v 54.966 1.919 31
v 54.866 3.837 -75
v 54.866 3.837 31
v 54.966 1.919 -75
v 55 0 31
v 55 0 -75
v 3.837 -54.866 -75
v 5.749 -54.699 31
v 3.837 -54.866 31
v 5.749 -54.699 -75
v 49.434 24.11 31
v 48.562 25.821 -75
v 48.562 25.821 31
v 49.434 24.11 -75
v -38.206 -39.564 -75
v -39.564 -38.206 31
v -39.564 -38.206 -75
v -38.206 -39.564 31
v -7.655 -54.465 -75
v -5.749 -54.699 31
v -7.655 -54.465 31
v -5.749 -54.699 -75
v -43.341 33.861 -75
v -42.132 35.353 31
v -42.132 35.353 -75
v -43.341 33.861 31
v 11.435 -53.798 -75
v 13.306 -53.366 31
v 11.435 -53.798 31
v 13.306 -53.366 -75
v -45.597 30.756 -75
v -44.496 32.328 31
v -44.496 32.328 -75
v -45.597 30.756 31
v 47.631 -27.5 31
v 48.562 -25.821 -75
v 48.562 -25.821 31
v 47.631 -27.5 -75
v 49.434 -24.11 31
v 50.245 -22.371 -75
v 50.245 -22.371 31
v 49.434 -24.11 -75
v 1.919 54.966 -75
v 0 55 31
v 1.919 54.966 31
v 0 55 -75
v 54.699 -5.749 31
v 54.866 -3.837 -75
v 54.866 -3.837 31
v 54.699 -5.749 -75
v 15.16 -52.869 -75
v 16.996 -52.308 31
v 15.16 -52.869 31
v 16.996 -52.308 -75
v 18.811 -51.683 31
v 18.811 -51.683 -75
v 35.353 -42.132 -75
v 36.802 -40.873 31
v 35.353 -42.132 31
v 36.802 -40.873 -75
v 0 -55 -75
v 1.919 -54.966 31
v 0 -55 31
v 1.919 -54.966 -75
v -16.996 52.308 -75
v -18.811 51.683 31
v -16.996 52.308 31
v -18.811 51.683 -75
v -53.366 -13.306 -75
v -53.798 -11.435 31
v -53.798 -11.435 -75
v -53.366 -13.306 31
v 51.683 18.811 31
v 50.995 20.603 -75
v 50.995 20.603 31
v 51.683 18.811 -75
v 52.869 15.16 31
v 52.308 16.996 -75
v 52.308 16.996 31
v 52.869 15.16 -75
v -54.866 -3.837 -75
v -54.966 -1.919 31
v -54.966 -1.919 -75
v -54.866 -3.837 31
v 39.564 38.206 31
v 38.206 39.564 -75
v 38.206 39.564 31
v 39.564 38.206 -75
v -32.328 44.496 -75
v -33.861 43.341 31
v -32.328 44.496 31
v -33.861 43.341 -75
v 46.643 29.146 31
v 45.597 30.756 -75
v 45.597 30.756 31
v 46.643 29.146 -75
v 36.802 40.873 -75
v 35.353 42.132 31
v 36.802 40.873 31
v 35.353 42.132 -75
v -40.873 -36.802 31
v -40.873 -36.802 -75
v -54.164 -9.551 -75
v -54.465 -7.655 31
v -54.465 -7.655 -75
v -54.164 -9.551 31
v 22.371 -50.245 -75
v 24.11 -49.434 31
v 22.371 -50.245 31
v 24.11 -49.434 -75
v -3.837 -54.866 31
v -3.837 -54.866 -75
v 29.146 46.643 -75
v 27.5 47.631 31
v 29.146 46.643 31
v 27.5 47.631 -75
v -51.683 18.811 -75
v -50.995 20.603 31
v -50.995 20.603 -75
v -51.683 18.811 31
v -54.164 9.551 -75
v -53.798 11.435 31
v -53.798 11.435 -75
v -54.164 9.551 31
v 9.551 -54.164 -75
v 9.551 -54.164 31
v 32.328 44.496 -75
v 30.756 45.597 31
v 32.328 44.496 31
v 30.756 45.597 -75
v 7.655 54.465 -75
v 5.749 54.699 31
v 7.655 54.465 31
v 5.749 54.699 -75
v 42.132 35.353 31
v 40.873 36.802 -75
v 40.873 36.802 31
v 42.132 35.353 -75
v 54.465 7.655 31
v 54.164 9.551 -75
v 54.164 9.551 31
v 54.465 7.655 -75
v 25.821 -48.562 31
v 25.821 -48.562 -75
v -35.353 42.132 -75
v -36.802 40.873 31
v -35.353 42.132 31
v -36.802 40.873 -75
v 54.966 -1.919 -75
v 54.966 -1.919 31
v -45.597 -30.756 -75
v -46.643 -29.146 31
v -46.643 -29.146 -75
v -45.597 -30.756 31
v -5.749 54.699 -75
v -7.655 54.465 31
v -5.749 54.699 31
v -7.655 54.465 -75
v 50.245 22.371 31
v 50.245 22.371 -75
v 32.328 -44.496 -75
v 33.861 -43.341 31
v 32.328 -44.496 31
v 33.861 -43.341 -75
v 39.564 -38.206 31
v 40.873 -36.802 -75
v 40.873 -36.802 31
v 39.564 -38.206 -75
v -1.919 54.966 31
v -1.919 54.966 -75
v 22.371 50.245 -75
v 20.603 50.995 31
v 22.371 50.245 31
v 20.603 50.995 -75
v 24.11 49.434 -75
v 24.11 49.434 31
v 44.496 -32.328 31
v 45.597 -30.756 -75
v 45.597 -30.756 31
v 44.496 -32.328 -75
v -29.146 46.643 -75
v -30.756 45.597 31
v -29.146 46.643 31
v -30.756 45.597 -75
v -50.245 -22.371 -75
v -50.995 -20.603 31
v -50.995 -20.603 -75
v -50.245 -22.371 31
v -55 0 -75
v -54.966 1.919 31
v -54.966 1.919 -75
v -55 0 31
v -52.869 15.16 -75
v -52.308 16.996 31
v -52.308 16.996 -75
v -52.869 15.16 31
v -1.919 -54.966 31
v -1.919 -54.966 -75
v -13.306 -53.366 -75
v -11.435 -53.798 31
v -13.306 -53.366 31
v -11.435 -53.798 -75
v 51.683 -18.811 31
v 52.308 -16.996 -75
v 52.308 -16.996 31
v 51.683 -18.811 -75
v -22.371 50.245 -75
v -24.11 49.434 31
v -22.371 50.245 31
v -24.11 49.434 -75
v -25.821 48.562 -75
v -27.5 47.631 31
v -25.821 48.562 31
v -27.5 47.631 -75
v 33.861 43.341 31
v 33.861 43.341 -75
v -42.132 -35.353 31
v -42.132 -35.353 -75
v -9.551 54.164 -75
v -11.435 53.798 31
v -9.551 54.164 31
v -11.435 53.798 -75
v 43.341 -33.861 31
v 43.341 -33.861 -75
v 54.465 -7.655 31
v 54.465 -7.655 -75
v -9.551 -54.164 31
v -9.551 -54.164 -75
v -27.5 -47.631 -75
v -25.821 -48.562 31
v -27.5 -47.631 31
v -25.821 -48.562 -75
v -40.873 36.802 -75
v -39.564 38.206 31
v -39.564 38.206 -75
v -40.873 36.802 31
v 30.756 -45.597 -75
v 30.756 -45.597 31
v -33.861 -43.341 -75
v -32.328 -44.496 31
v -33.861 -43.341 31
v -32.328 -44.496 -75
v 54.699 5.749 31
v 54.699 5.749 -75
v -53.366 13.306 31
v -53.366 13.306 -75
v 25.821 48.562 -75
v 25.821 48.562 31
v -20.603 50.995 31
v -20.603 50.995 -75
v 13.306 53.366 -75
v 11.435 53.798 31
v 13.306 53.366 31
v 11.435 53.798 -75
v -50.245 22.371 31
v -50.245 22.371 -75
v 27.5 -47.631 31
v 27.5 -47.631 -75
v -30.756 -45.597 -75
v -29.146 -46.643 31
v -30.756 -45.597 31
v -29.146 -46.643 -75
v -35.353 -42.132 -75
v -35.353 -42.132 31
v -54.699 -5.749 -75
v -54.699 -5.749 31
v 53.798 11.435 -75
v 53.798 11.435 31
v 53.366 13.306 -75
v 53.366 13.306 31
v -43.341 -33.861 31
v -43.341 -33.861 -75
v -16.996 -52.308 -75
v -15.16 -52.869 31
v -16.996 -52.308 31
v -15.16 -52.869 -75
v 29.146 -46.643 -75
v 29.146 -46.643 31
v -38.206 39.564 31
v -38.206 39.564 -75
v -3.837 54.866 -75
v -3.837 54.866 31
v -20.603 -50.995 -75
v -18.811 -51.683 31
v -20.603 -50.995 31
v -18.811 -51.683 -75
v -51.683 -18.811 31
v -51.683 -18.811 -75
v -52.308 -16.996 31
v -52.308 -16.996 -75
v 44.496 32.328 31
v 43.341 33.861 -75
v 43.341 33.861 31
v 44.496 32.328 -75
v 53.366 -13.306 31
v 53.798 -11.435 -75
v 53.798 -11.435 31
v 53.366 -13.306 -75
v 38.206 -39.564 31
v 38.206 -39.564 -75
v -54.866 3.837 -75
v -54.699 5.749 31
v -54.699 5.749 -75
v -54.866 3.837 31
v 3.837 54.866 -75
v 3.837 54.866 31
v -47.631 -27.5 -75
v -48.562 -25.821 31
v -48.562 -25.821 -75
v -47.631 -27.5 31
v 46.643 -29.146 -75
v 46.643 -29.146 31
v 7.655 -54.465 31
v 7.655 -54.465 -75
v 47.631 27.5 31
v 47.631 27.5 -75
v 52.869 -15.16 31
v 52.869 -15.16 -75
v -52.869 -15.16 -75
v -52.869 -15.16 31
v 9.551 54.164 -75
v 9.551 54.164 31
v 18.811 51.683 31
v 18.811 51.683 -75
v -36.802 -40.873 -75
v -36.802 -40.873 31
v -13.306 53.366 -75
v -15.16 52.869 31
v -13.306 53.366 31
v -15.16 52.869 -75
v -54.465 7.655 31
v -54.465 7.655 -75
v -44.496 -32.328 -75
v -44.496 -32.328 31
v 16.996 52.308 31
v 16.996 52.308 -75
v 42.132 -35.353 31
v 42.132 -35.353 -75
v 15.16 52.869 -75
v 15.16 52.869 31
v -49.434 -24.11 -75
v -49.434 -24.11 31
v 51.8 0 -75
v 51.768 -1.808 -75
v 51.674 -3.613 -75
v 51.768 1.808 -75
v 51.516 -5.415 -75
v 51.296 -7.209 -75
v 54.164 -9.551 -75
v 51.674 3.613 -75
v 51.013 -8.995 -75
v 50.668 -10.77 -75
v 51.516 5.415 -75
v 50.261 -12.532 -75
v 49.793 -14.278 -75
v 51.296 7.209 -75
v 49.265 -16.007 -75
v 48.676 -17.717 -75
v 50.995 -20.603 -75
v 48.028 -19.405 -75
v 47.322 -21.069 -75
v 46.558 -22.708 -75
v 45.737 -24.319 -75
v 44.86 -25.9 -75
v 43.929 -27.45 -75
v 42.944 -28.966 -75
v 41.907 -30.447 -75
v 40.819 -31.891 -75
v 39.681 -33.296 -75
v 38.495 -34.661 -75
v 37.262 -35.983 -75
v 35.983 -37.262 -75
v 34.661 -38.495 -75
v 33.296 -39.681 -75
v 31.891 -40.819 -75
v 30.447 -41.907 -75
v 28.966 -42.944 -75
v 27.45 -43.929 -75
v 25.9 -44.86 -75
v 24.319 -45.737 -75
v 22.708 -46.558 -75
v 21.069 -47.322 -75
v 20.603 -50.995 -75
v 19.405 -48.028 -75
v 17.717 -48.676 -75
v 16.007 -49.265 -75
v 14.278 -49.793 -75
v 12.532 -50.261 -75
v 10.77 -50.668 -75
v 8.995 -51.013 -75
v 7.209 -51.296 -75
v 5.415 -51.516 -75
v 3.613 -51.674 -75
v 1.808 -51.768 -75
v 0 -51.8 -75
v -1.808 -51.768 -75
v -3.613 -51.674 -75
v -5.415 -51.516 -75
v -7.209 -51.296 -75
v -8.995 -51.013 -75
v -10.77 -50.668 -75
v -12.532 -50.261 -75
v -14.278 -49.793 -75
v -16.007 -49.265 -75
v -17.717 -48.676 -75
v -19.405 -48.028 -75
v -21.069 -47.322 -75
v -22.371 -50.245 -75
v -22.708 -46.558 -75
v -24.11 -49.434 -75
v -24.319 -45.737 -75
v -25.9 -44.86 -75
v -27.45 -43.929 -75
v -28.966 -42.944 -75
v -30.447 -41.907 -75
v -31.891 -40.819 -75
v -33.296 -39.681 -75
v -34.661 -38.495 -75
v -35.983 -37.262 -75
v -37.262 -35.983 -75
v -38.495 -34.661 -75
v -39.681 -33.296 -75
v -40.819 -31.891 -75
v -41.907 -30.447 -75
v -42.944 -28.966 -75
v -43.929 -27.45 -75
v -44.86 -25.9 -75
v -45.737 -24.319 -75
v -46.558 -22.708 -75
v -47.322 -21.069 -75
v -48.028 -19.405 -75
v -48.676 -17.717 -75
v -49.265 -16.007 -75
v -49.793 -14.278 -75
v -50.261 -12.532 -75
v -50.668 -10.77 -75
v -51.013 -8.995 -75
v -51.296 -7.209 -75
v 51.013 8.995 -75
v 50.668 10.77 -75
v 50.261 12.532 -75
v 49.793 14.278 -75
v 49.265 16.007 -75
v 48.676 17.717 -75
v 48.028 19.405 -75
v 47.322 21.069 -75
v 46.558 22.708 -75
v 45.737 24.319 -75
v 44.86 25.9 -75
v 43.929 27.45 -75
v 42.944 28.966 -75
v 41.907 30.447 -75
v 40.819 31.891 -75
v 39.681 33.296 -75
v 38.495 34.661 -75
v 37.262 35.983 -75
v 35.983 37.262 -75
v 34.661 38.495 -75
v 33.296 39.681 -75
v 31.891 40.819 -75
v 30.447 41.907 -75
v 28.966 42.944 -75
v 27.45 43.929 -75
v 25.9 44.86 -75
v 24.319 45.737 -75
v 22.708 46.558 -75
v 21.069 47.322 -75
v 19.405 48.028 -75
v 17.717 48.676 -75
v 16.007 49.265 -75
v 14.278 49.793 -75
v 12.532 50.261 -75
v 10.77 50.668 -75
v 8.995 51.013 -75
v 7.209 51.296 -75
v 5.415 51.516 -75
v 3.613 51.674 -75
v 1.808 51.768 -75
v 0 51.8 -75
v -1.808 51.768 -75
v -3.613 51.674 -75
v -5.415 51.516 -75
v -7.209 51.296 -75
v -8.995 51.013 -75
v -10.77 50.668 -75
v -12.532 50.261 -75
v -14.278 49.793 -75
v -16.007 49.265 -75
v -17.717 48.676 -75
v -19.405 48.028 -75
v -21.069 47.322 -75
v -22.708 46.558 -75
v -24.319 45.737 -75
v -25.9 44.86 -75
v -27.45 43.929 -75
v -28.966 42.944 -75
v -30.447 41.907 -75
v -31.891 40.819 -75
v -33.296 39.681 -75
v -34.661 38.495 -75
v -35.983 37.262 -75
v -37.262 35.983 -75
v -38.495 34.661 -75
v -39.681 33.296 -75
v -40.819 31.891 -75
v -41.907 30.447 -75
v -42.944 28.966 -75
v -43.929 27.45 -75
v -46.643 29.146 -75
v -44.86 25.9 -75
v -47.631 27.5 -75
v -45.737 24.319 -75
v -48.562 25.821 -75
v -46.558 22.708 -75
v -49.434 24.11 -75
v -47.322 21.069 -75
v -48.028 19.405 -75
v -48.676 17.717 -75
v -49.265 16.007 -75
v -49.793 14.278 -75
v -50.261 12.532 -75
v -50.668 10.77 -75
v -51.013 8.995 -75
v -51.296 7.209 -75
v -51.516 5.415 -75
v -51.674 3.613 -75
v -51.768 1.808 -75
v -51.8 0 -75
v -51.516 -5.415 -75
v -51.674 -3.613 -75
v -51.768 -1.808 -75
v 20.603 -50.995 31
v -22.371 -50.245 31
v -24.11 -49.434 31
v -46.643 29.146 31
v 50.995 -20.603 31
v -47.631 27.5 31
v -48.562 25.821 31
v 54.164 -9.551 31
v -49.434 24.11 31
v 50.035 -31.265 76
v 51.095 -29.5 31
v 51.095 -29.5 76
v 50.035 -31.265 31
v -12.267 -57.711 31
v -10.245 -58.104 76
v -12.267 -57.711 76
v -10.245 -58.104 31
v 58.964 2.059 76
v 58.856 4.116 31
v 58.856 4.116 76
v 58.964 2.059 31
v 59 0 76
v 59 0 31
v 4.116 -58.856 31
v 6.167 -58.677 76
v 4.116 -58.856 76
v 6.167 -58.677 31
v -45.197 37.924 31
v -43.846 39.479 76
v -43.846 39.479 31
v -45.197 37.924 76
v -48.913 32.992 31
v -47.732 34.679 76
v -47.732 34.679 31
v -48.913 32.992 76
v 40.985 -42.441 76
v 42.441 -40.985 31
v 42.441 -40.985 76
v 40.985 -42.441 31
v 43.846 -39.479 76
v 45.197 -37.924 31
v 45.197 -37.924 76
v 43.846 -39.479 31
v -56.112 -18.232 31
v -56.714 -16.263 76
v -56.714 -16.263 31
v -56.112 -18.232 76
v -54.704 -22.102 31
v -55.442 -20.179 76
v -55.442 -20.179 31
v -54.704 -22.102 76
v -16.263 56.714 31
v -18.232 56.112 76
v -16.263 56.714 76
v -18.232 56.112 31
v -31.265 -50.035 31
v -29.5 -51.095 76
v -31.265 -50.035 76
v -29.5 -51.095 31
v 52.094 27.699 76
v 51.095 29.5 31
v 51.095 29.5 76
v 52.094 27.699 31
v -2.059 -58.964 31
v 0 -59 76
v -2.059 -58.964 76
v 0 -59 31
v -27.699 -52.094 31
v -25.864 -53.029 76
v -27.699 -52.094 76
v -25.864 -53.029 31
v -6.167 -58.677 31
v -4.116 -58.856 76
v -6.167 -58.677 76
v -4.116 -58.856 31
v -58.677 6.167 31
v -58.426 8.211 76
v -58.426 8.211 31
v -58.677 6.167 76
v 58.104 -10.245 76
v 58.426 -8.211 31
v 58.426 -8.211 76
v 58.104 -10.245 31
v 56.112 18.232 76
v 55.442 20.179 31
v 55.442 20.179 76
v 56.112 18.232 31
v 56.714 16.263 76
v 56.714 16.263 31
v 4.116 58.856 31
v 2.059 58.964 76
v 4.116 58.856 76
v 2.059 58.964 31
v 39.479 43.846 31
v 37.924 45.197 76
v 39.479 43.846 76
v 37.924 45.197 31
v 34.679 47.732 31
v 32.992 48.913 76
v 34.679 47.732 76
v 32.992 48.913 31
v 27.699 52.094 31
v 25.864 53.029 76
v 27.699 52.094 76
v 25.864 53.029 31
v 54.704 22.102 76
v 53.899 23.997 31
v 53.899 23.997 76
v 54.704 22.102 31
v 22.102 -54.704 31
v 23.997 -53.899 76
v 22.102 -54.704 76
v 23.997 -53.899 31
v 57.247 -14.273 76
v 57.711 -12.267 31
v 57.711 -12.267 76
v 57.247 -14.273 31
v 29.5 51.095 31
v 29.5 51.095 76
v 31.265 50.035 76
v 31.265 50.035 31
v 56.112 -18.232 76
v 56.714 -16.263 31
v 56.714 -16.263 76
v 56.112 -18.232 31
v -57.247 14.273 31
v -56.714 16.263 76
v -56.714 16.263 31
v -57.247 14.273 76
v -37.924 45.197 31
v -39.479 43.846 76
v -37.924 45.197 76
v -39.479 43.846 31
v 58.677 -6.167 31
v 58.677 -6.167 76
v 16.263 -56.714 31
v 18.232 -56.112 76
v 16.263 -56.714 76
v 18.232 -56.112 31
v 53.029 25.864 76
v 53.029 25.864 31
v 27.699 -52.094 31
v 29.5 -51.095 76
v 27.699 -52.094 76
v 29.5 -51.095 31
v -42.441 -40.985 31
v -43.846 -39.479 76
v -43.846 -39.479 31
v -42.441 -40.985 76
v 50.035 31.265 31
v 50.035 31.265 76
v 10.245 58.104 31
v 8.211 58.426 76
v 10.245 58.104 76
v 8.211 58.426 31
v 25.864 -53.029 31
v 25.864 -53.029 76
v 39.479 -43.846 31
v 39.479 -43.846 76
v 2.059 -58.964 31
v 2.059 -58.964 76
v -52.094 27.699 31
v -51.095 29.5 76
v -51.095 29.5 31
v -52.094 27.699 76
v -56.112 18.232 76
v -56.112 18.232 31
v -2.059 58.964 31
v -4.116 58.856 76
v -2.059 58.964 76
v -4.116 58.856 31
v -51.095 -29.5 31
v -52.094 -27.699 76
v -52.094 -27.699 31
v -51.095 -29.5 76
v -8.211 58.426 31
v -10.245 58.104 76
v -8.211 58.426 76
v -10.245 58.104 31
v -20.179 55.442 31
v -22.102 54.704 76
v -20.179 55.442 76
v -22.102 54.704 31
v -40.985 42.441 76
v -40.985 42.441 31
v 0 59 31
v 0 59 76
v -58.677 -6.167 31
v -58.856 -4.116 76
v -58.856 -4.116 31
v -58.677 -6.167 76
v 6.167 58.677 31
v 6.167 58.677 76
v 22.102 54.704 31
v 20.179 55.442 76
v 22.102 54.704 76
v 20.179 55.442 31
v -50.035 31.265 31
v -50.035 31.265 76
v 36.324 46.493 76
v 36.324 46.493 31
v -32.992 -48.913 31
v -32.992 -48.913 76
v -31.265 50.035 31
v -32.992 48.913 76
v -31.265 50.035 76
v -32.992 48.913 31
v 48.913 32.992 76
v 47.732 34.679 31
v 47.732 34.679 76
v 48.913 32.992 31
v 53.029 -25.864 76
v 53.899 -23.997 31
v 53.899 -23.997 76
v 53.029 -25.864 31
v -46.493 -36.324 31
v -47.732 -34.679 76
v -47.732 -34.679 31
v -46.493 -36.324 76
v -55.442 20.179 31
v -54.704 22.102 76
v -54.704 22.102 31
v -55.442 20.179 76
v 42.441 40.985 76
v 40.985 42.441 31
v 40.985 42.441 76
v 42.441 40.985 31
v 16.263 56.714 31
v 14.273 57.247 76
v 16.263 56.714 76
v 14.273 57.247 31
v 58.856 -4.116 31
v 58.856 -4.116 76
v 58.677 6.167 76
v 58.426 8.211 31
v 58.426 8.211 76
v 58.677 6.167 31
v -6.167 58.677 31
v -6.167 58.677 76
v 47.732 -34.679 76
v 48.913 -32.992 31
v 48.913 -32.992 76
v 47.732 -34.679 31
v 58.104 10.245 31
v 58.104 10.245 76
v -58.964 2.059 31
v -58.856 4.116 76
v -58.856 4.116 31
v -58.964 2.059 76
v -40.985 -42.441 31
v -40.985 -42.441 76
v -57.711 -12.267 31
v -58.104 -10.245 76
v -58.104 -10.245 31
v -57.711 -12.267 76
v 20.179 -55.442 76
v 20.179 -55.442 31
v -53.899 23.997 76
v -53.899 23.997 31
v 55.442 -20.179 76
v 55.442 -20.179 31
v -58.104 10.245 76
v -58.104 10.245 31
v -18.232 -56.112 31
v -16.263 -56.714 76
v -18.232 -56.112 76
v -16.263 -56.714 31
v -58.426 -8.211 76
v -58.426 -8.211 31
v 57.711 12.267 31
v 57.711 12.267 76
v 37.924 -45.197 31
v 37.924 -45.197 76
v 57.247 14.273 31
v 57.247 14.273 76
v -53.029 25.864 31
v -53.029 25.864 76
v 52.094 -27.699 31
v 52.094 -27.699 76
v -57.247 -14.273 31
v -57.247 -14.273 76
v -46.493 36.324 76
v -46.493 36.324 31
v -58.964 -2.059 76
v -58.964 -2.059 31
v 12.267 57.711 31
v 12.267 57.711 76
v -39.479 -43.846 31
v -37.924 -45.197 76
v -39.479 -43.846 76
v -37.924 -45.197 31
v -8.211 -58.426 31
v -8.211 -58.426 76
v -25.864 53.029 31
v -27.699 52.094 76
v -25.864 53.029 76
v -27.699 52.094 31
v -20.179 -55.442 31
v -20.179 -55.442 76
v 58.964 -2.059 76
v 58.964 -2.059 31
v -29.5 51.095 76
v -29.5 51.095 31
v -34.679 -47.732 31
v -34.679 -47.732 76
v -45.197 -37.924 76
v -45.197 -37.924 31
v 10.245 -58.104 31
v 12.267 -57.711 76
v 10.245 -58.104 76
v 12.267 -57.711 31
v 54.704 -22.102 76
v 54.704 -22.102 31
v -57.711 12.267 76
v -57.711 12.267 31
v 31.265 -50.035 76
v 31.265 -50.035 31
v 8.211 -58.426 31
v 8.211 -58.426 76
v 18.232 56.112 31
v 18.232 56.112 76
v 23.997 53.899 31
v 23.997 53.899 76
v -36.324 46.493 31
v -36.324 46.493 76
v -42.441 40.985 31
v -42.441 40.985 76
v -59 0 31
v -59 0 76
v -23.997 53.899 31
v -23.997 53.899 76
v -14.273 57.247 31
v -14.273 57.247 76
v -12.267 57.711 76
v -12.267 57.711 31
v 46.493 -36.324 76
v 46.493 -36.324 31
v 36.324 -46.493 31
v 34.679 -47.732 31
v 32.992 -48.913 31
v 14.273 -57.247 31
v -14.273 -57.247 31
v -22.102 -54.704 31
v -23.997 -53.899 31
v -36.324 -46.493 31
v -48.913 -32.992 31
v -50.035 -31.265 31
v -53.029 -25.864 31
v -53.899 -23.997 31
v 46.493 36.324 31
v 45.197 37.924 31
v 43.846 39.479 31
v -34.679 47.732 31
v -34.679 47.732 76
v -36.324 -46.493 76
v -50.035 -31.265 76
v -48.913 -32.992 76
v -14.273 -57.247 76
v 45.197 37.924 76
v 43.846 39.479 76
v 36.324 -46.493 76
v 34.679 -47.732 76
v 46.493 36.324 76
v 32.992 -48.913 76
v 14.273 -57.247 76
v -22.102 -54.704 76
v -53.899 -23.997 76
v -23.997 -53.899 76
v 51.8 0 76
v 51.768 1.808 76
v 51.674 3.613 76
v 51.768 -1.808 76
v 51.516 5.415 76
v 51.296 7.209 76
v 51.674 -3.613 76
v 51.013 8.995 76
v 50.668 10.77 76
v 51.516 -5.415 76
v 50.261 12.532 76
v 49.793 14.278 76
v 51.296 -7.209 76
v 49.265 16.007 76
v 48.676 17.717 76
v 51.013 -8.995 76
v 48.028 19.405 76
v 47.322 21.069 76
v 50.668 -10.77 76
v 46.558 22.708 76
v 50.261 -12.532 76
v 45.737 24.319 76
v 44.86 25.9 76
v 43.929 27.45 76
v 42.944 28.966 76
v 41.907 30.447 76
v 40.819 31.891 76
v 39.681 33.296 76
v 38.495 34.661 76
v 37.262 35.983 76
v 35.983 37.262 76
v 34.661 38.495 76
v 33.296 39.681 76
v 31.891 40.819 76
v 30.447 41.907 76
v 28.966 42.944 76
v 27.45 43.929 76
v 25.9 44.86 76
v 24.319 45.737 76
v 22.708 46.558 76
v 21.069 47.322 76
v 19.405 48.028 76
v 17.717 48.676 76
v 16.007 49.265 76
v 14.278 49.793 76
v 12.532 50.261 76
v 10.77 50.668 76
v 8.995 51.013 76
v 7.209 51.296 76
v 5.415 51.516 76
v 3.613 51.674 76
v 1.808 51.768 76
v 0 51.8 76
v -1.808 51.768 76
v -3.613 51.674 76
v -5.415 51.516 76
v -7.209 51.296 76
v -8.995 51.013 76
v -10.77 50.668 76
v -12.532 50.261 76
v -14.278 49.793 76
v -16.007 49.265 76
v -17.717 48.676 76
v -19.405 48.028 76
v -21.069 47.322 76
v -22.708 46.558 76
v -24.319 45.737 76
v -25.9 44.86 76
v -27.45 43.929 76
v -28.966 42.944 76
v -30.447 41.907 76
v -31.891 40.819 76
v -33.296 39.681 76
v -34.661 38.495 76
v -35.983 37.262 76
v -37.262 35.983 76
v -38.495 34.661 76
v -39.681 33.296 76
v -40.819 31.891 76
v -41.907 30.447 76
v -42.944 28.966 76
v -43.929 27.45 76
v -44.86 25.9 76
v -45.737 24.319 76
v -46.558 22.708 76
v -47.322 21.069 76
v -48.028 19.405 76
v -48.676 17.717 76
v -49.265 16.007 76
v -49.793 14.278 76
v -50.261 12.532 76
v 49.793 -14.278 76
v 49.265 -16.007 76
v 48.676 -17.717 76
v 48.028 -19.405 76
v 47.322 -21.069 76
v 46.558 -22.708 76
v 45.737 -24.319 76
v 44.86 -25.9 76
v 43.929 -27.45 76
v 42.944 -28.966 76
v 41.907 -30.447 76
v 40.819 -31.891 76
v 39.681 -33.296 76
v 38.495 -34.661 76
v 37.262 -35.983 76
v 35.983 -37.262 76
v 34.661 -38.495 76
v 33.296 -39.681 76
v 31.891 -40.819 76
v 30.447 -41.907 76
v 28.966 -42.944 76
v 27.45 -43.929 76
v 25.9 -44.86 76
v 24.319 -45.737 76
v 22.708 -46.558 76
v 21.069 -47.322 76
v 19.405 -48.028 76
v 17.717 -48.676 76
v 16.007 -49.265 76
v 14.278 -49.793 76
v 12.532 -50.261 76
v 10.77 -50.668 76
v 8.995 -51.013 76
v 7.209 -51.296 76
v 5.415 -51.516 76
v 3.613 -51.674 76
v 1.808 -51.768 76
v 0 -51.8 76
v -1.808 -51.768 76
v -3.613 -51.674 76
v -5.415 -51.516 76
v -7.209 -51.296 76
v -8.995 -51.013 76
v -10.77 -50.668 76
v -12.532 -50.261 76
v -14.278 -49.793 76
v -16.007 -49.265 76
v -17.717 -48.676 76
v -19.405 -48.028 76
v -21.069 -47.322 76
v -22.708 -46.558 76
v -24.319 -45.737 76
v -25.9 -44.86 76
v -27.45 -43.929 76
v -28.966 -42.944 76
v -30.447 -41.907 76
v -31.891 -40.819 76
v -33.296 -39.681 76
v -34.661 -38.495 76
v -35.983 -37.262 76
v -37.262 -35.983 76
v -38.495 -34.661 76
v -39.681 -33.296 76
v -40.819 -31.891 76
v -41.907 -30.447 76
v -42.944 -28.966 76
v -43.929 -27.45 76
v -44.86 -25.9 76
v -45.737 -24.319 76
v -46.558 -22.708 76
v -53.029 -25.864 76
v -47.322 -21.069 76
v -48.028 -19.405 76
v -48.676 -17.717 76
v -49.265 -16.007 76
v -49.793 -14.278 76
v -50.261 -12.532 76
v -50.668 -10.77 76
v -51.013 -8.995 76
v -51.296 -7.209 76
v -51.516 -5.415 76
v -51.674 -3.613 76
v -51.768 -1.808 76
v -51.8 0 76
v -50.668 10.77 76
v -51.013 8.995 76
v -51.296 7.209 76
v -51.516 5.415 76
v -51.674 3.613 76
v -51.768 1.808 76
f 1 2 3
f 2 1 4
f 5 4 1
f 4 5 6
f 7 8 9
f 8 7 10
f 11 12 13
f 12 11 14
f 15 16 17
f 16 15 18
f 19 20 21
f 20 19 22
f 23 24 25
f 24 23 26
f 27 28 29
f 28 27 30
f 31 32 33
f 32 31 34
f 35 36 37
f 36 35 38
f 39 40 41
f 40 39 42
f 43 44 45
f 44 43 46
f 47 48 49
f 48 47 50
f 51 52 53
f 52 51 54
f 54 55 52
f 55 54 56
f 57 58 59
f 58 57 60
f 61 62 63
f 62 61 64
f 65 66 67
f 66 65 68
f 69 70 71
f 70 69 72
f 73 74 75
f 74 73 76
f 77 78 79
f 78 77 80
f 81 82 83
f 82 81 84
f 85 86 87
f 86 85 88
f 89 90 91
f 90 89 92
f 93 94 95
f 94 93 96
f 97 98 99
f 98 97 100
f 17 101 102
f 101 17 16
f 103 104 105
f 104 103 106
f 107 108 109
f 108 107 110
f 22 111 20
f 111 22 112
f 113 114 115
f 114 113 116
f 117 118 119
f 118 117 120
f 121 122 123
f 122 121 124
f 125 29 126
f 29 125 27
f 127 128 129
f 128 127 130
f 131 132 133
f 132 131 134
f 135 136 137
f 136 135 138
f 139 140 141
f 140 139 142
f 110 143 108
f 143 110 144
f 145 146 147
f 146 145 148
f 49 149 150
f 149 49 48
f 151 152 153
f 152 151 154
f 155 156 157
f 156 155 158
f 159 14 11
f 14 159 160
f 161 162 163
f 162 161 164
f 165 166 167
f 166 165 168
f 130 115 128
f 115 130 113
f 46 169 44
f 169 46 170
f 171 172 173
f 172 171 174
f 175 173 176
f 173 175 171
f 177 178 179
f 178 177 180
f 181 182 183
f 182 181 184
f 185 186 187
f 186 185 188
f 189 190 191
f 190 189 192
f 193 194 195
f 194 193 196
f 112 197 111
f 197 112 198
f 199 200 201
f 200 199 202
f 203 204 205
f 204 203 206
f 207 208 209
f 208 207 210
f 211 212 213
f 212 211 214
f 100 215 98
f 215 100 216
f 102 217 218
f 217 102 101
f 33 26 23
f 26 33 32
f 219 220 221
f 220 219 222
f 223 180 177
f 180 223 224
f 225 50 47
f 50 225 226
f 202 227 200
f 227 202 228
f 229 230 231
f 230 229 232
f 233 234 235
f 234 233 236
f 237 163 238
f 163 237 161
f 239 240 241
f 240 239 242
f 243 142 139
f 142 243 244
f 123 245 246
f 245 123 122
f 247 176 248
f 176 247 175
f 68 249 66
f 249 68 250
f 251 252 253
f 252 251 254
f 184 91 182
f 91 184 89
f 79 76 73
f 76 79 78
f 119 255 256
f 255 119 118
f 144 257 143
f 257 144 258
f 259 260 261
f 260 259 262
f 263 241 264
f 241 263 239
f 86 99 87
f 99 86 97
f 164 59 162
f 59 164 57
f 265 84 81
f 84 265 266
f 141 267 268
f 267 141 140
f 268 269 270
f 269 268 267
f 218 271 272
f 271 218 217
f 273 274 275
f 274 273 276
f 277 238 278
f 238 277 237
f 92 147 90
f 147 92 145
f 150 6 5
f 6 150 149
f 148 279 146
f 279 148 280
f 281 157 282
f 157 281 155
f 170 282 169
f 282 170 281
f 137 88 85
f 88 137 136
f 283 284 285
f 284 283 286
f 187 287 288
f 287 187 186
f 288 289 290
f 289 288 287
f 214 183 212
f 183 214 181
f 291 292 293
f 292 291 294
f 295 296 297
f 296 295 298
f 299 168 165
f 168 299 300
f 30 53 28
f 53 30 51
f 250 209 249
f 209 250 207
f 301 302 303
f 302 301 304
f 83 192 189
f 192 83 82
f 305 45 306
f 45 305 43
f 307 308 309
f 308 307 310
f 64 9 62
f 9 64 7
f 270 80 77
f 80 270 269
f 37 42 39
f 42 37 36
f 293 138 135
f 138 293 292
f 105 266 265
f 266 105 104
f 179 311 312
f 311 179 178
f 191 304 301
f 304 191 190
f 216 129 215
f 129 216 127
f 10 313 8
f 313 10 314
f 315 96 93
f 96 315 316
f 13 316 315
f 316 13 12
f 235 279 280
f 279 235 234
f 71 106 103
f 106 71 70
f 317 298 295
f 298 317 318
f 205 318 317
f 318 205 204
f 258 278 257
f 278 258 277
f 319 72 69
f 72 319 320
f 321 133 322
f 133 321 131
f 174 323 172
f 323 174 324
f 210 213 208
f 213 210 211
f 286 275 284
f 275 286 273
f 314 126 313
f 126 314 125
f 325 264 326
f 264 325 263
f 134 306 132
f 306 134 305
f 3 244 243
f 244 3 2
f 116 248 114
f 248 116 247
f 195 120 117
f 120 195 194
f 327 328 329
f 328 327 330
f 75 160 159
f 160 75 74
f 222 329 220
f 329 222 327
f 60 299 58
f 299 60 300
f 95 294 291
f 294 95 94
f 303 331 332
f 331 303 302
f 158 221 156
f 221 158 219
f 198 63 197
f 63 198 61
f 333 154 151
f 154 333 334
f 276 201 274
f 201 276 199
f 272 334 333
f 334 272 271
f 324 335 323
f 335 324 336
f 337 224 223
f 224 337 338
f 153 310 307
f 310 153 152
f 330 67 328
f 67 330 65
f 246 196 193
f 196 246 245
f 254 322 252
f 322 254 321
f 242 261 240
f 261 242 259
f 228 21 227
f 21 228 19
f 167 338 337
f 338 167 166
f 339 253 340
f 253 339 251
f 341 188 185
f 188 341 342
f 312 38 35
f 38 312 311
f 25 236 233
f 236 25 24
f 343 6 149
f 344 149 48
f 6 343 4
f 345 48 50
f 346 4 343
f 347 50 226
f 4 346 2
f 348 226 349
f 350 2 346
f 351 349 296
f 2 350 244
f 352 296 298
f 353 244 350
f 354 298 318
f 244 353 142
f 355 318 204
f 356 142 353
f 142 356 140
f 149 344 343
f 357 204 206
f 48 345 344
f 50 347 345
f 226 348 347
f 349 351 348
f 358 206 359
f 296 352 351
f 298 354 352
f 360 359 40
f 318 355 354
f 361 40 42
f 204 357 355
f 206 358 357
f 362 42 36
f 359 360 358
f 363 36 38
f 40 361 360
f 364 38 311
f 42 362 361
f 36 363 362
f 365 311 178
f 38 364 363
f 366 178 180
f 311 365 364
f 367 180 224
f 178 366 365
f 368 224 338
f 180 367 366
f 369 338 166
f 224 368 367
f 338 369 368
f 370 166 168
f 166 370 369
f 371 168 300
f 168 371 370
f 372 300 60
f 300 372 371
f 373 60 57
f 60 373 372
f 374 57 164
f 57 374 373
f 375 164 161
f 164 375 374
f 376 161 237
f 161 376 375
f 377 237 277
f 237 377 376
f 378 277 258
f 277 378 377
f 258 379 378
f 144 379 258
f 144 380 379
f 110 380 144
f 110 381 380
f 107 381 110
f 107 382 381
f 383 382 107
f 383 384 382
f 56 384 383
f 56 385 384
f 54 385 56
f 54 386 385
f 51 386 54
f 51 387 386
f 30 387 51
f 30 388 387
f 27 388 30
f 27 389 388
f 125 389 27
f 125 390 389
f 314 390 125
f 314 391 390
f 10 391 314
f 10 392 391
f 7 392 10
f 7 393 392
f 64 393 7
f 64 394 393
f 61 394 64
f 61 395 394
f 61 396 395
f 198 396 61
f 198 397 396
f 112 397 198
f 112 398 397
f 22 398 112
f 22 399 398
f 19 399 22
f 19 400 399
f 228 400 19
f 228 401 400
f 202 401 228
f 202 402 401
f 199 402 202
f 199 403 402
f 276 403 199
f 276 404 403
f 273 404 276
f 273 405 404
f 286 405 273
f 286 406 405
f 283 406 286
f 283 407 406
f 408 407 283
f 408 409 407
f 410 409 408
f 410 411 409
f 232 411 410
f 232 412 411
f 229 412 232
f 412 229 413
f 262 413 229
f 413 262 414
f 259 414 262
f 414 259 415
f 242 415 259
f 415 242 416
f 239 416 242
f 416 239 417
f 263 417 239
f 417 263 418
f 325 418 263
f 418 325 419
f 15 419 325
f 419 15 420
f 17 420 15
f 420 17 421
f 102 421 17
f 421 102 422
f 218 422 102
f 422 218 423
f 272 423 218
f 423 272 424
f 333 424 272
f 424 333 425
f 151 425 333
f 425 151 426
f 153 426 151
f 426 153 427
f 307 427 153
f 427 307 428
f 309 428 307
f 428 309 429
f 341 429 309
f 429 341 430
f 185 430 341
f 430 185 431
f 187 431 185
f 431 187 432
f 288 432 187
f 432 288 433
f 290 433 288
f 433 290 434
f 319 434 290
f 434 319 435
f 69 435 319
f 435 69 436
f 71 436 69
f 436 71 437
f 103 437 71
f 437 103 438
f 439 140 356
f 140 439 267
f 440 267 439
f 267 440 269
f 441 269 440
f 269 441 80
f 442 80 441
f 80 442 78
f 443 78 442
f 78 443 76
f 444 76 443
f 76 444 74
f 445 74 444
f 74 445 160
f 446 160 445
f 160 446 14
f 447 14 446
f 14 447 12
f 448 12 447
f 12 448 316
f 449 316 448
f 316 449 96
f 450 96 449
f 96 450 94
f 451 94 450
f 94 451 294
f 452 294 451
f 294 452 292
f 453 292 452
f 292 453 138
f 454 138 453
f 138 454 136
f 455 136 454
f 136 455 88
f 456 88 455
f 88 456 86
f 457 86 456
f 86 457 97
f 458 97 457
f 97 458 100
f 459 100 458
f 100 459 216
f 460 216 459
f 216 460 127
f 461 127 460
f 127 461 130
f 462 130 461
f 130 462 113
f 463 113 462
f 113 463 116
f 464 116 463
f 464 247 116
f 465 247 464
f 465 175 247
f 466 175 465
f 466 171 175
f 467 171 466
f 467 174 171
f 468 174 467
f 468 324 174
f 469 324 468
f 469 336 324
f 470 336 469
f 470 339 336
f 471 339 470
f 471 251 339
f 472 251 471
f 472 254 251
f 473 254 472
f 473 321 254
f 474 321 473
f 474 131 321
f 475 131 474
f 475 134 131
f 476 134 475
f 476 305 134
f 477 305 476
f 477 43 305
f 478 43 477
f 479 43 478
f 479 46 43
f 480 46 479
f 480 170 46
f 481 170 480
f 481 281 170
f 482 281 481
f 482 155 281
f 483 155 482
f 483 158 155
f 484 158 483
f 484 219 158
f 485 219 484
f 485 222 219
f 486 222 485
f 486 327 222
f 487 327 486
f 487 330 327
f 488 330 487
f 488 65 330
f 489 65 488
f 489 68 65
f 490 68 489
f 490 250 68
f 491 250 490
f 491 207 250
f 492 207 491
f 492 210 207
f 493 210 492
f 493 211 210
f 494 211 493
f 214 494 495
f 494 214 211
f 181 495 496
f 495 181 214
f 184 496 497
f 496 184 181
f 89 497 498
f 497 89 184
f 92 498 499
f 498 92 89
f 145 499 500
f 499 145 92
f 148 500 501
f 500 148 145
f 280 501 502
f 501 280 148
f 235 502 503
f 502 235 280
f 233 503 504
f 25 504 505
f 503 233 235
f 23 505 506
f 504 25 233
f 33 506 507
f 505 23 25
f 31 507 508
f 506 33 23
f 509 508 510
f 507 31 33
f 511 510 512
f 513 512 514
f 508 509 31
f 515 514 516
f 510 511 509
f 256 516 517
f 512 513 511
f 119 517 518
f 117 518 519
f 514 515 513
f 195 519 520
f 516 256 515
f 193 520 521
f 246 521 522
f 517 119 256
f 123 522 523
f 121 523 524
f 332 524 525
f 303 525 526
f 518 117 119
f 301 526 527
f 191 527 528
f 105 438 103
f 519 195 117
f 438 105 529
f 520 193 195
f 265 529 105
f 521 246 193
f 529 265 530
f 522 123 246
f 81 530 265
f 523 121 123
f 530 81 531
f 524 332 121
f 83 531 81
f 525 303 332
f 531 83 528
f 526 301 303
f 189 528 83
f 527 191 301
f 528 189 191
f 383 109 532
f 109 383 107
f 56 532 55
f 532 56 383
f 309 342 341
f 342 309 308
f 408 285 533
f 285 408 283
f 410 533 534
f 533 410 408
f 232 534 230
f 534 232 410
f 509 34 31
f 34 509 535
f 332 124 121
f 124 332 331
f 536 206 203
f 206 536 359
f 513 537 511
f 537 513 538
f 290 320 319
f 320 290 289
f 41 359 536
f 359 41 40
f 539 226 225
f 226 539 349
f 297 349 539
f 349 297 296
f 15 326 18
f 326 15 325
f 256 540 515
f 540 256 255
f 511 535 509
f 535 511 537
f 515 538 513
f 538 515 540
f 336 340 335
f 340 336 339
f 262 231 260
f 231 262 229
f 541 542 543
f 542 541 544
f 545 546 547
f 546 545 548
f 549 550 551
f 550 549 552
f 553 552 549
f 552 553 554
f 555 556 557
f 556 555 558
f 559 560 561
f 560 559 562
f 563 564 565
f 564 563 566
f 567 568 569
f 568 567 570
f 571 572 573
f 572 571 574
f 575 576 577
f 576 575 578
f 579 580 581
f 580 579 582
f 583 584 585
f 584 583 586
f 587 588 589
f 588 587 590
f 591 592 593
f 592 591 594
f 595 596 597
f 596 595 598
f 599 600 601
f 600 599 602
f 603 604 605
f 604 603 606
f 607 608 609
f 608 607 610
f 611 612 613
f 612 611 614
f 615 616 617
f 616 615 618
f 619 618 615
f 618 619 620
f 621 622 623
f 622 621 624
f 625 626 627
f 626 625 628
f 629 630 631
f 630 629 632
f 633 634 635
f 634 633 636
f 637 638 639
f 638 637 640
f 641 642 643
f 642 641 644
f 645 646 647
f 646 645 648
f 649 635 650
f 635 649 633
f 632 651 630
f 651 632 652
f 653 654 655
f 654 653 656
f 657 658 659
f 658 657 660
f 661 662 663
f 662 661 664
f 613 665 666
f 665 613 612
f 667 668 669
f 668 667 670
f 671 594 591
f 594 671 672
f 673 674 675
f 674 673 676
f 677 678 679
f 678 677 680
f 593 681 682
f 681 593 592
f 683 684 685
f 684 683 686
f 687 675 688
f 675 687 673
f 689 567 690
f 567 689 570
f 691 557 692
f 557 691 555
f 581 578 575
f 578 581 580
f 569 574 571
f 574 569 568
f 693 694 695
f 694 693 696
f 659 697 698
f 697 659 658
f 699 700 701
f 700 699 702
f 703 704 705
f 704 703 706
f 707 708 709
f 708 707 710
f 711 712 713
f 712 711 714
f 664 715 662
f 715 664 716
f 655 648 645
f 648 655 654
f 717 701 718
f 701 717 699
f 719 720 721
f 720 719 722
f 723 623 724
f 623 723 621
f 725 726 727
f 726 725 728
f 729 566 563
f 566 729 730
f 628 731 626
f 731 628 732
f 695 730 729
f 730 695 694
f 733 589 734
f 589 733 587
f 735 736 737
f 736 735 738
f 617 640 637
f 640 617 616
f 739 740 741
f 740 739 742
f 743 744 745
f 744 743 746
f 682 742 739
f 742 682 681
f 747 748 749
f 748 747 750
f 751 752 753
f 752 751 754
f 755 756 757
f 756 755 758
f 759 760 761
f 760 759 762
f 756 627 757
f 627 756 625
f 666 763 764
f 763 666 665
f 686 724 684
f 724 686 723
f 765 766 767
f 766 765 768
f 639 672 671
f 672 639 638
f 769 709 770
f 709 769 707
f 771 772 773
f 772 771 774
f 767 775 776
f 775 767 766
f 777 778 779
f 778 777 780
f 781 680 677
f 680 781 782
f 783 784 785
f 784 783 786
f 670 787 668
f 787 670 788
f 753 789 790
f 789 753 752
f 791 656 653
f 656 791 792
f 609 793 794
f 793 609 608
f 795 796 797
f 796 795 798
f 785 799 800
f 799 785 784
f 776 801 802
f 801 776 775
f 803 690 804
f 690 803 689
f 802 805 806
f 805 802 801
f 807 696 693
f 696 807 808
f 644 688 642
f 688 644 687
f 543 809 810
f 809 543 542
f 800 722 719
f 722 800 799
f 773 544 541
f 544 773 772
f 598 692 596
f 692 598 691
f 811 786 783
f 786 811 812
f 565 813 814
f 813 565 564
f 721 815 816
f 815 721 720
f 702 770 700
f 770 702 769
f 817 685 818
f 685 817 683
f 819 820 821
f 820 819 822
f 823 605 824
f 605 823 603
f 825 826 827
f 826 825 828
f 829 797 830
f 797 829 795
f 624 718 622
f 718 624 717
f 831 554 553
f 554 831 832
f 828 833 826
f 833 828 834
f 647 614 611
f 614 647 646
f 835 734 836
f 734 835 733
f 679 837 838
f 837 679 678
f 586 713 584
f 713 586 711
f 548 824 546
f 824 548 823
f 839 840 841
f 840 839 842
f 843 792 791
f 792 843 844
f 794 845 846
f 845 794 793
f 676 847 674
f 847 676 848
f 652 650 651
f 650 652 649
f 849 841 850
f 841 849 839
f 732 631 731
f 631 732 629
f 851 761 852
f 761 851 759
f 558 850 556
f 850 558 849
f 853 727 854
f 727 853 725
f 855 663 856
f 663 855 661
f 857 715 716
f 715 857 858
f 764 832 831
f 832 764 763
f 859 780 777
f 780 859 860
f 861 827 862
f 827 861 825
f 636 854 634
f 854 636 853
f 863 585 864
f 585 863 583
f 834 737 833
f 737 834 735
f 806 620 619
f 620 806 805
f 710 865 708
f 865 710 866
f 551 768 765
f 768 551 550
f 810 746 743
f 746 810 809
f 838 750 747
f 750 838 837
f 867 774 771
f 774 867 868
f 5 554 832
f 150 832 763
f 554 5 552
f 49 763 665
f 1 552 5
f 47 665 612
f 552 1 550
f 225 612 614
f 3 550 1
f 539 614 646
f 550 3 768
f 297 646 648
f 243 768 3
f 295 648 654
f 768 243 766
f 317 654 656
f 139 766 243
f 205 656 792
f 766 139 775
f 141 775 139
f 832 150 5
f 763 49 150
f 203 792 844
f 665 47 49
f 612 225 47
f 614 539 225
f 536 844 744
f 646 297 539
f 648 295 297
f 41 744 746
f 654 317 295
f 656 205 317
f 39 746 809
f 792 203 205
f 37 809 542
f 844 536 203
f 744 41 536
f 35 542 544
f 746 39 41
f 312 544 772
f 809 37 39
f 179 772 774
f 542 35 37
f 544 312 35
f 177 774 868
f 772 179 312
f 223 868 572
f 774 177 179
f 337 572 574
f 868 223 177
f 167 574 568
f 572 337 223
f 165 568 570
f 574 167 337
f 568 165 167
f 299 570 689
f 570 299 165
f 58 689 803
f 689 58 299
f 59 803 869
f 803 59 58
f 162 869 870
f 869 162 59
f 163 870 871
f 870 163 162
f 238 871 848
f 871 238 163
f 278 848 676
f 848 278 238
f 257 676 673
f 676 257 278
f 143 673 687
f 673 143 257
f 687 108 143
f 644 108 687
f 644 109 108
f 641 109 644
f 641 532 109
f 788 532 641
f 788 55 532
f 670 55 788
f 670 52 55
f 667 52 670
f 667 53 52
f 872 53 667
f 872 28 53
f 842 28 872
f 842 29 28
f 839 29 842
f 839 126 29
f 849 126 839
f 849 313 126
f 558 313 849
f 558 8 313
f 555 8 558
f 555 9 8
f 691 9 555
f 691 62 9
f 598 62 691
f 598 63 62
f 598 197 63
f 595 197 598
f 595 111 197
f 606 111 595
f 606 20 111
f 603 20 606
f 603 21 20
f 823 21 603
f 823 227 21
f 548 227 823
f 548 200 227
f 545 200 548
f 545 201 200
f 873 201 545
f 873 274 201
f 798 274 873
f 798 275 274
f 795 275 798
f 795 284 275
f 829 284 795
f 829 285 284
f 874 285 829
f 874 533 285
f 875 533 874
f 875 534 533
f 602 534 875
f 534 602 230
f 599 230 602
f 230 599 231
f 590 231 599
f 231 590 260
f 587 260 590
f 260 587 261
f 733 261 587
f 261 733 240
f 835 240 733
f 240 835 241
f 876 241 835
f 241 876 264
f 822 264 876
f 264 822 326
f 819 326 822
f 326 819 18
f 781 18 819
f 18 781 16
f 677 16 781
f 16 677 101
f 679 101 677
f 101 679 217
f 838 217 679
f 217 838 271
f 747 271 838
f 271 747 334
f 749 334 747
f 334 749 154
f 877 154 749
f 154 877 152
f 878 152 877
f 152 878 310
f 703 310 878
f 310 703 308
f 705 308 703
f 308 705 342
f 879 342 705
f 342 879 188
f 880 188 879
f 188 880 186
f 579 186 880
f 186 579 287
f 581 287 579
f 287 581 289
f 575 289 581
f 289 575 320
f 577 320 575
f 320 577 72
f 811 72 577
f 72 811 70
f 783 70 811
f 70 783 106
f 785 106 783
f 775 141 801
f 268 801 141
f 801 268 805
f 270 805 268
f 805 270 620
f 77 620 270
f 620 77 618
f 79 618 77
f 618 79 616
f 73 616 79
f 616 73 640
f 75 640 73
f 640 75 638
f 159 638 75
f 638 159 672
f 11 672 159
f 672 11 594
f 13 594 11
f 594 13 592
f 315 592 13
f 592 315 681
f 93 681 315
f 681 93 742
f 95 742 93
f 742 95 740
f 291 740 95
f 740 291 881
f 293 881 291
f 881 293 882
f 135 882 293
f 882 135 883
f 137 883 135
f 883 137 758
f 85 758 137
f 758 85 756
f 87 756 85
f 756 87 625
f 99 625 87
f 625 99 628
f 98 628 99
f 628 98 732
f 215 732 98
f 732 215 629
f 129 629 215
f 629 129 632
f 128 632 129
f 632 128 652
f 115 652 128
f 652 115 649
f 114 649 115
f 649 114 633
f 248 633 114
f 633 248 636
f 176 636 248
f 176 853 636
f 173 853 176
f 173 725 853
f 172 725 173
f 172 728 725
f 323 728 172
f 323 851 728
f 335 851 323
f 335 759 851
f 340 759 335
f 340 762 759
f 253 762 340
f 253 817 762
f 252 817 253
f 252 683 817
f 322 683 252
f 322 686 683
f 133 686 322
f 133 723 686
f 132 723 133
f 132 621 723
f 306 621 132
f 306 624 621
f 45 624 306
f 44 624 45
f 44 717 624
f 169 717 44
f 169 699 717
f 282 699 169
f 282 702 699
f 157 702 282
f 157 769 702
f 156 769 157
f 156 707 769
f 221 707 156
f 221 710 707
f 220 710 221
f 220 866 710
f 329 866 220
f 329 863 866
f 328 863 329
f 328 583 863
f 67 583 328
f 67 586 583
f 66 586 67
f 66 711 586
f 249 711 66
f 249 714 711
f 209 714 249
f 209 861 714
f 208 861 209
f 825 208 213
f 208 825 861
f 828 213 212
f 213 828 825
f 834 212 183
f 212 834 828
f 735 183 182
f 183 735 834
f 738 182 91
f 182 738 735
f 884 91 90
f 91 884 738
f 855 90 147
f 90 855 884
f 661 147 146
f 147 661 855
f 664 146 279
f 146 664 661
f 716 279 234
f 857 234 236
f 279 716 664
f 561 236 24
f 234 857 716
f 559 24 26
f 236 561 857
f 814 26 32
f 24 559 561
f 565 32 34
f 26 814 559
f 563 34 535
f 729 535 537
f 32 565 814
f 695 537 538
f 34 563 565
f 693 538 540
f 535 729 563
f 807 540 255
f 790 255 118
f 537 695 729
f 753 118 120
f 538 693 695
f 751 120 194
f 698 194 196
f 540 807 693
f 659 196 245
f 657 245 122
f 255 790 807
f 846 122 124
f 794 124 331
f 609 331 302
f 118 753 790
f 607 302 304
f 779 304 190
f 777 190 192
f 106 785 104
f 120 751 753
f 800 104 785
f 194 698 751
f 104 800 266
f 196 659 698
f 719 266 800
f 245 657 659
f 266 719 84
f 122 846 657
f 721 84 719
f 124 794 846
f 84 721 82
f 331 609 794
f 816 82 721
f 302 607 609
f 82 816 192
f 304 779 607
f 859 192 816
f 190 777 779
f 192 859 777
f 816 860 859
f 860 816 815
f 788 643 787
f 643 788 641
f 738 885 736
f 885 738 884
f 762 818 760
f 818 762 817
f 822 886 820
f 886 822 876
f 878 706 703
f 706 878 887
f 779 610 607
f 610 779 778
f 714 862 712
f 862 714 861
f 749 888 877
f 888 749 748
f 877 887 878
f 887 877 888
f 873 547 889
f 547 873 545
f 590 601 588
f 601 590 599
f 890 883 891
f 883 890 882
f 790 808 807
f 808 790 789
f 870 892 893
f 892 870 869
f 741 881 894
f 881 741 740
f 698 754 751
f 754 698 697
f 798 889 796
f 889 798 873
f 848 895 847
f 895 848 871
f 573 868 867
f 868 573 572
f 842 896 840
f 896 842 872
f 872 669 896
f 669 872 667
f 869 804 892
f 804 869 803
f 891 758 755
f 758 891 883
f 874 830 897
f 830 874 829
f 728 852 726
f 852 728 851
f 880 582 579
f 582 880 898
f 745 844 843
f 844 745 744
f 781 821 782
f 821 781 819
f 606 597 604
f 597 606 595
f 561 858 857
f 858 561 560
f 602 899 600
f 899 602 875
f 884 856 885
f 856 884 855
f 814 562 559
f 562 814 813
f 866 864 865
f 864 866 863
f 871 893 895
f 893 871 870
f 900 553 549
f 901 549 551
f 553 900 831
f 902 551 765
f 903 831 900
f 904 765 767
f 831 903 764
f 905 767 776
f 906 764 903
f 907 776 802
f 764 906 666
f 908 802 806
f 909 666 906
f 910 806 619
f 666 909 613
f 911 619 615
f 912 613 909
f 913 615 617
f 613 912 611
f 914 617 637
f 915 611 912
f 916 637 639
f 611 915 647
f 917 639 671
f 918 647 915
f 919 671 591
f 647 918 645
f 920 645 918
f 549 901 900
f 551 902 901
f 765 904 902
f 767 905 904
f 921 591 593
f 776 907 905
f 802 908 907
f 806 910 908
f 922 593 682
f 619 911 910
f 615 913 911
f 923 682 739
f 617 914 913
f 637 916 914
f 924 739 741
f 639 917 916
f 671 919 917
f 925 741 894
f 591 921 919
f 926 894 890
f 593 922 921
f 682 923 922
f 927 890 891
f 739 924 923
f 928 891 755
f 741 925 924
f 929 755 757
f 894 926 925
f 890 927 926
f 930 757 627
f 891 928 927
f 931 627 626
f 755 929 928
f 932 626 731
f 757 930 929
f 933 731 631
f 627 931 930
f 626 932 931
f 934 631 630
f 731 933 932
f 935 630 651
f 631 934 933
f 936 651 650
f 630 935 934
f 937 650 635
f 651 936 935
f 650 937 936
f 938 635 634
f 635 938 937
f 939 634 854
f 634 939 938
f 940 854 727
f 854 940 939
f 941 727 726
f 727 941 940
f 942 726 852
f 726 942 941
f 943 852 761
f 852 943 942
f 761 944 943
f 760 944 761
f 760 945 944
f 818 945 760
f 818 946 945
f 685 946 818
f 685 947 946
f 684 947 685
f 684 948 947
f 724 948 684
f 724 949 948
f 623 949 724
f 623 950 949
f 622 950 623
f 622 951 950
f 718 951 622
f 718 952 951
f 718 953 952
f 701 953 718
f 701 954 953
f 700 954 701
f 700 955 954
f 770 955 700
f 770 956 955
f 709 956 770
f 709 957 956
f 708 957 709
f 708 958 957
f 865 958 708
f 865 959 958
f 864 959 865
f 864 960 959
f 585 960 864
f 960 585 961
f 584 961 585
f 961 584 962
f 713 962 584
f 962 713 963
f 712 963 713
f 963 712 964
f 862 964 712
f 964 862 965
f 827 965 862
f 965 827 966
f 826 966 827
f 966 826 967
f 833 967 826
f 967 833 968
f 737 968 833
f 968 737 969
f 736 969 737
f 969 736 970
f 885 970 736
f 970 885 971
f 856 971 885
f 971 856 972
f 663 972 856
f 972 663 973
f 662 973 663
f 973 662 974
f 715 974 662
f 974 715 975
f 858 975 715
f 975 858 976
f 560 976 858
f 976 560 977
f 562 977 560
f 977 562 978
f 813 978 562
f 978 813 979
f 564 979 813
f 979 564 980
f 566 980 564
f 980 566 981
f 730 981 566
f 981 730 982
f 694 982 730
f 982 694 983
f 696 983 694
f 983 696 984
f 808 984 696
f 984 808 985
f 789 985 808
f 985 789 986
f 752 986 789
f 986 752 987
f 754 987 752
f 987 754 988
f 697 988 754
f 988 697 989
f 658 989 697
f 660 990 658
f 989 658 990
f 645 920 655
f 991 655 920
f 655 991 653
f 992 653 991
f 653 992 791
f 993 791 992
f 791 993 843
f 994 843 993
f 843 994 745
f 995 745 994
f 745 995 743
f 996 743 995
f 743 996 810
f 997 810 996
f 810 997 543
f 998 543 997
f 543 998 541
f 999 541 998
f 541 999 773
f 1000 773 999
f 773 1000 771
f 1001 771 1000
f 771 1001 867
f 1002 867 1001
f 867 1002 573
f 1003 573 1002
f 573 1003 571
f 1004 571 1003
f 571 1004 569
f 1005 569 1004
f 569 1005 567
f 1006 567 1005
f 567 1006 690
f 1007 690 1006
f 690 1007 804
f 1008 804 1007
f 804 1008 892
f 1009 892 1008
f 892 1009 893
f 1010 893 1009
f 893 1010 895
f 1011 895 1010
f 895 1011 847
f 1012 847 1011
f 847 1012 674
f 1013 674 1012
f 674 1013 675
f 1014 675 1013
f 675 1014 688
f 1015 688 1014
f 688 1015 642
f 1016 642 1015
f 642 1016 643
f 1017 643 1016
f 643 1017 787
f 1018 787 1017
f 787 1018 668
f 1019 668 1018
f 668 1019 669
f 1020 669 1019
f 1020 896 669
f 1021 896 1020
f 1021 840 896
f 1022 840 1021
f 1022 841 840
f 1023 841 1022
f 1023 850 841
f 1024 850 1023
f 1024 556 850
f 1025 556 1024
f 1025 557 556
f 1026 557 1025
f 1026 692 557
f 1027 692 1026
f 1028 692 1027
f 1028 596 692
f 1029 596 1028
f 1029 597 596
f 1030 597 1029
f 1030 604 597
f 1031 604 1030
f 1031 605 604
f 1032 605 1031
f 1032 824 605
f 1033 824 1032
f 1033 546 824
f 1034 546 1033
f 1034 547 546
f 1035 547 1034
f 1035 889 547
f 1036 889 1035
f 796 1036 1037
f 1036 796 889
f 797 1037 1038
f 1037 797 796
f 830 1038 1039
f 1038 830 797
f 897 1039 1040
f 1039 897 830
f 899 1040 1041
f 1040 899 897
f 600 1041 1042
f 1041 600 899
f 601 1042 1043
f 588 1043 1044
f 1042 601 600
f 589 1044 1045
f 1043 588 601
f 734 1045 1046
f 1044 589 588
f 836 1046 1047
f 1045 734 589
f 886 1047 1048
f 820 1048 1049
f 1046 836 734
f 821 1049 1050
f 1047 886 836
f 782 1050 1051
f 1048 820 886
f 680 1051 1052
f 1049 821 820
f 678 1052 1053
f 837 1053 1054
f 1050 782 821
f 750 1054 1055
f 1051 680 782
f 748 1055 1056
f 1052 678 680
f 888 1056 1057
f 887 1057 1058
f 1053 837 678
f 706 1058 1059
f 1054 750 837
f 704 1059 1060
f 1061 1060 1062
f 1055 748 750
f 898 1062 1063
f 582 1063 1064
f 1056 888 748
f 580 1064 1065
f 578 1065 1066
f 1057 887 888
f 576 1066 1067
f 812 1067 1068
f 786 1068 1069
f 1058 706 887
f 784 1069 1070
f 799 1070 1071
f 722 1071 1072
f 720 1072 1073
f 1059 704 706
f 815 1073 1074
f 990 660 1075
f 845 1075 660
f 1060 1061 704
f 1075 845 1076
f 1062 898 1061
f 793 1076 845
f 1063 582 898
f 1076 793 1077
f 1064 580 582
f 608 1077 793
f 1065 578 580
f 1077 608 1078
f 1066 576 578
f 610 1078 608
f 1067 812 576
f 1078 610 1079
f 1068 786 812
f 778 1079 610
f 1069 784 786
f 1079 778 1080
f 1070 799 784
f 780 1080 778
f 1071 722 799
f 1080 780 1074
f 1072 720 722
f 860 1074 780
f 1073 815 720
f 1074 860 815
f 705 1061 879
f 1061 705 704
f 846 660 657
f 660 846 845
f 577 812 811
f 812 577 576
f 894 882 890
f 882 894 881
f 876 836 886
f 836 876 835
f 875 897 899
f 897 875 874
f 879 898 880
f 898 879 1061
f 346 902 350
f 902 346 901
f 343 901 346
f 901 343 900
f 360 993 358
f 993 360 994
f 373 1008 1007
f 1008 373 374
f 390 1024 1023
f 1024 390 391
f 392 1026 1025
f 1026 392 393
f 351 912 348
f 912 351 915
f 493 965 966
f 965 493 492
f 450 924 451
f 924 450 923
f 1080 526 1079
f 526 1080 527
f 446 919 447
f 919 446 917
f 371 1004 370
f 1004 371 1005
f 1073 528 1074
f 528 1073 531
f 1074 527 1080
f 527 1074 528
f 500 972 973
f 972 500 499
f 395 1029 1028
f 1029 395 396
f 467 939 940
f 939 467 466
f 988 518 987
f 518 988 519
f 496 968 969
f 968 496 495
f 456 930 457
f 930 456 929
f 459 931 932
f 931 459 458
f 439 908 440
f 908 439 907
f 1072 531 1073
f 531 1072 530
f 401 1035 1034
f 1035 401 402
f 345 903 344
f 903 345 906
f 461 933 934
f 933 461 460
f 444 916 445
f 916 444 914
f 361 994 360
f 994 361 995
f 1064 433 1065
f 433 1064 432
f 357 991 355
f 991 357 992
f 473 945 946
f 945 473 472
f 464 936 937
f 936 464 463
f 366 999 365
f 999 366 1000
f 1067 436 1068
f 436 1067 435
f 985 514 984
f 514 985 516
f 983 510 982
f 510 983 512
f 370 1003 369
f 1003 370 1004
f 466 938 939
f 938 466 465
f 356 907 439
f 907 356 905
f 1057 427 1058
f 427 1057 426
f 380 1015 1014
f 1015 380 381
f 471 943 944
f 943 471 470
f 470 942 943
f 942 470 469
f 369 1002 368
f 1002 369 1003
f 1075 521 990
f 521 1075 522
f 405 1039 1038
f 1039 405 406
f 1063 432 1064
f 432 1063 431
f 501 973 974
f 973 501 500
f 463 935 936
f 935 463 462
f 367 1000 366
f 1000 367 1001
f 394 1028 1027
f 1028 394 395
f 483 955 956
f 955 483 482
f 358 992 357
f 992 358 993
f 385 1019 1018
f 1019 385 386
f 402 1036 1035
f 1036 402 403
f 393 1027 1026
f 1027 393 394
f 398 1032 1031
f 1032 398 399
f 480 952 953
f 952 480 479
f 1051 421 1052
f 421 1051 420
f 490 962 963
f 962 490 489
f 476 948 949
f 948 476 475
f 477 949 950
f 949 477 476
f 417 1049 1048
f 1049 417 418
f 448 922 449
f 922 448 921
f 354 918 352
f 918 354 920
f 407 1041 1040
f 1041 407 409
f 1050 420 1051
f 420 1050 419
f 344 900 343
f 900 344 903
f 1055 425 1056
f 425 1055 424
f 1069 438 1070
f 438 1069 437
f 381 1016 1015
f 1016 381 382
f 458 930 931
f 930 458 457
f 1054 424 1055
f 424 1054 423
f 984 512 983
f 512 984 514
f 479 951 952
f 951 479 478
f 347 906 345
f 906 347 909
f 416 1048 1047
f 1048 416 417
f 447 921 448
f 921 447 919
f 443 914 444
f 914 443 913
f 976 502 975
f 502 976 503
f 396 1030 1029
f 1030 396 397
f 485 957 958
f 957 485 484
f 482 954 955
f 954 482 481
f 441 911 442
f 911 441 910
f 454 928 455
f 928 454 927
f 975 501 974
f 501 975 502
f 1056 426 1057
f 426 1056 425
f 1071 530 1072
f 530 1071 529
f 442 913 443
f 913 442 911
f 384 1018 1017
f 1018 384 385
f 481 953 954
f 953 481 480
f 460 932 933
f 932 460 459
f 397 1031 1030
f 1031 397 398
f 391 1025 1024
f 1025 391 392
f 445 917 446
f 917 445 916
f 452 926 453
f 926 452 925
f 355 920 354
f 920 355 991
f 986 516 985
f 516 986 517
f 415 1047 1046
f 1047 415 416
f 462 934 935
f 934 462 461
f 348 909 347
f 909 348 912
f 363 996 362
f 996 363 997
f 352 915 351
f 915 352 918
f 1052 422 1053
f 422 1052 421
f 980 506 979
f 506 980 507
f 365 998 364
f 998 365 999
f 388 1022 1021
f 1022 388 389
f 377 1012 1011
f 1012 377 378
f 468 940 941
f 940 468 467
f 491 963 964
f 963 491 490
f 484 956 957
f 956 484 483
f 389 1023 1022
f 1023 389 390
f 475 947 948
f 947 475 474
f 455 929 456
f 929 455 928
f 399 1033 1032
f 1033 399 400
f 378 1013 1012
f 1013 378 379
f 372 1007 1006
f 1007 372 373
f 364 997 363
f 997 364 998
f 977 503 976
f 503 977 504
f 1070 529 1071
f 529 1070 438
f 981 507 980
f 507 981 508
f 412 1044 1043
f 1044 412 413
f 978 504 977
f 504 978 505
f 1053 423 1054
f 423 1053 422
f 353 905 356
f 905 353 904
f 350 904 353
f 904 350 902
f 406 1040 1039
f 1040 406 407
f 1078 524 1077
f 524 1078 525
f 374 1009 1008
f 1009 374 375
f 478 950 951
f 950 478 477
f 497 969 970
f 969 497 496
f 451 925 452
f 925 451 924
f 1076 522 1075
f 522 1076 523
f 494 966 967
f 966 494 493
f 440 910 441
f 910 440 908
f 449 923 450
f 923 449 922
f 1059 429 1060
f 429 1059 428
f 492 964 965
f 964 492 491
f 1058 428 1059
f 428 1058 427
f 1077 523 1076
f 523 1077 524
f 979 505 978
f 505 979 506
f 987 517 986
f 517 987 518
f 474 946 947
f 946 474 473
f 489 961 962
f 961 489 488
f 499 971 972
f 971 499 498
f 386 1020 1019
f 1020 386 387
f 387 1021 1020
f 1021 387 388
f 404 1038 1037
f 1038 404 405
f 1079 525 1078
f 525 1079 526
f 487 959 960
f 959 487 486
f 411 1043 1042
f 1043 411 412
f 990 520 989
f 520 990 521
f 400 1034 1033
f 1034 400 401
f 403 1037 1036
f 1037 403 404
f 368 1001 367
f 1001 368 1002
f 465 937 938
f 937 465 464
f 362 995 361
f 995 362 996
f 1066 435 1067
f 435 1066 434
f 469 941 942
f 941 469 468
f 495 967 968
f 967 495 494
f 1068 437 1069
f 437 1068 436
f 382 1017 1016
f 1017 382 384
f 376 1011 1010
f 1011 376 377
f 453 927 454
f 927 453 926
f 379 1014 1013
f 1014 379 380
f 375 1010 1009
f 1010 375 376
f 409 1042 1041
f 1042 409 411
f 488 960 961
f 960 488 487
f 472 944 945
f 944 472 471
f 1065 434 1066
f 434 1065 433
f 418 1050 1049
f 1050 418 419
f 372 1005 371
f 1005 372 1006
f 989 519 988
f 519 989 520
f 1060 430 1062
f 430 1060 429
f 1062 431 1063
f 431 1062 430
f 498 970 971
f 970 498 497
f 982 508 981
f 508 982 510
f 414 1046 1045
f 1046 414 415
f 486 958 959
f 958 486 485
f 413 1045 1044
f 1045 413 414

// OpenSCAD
$fn = 180;

// Parameters (mm)
pipe_length = 150;                 //[75:300:1]
outer_diameter = 110;              //[55:220:1]
wall_thickness = 3.2;              //[1.6:6.4:0.1]
socket_length = 45;                //[20:90:1]
socket_outer_diameter = 118;       //[112:140:1]
chamfer_length = 2;                //[1:6:0.5]
overlap = 1;                       //[0.5:2:0.1]

// Derived
outer_r        = outer_diameter/2;
socket_outer_r = socket_outer_diameter/2;
inner_r        = outer_r - wall_thickness;

// Z extents (centered model)
z_min = -pipe_length/2;
z_max =  pipe_length/2;

// Socket placement (on +Z end, connected with overlap)
socket_zc = z_max - socket_length/2 + overlap;

// Chamfer centers
chamfer_plain_zc  = z_min + chamfer_length/2;
chamfer_socket_zc = z_max - chamfer_length/2;

// Geometry
module outer_shell() {
    union() {
        // Main pipe OD
        cylinder(h=pipe_length, r=outer_r, center=true);

        // Socket OD (slightly larger) on +Z end, connected
        translate([0,0,socket_zc])
            cylinder(h=socket_length, r=socket_outer_r, center=true);

        // Outer chamfer on plain end
        translate([0,0,chamfer_plain_zc])
            cylinder(h=chamfer_length,
                     r1=outer_r,
                     r2=max(outer_r - chamfer_length, 0.01),
                     center=true);

        // Outer chamfer on socket end
        translate([0,0,chamfer_socket_zc])
            cylinder(h=chamfer_length,
                     r1=socket_outer_r,
                     r2=max(socket_outer_r - chamfer_length, 0.01),
                     center=true);
    }
}

module inner_void() {
    // Make the bore longer than the entire outer shell (including socket)
    // so both ends are open and the hollow is visible in orthographic views.
    total_outer_len = pipe_length + socket_length; // conservative
    cylinder(h=total_outer_len + 4*overlap, r=inner_r, center=true);
}

module complete_model() {
    difference() {
        outer_shell();
        inner_void();
    }
}

// Final Output
color([0.85, 0.85, 0.8])
complete_model();
